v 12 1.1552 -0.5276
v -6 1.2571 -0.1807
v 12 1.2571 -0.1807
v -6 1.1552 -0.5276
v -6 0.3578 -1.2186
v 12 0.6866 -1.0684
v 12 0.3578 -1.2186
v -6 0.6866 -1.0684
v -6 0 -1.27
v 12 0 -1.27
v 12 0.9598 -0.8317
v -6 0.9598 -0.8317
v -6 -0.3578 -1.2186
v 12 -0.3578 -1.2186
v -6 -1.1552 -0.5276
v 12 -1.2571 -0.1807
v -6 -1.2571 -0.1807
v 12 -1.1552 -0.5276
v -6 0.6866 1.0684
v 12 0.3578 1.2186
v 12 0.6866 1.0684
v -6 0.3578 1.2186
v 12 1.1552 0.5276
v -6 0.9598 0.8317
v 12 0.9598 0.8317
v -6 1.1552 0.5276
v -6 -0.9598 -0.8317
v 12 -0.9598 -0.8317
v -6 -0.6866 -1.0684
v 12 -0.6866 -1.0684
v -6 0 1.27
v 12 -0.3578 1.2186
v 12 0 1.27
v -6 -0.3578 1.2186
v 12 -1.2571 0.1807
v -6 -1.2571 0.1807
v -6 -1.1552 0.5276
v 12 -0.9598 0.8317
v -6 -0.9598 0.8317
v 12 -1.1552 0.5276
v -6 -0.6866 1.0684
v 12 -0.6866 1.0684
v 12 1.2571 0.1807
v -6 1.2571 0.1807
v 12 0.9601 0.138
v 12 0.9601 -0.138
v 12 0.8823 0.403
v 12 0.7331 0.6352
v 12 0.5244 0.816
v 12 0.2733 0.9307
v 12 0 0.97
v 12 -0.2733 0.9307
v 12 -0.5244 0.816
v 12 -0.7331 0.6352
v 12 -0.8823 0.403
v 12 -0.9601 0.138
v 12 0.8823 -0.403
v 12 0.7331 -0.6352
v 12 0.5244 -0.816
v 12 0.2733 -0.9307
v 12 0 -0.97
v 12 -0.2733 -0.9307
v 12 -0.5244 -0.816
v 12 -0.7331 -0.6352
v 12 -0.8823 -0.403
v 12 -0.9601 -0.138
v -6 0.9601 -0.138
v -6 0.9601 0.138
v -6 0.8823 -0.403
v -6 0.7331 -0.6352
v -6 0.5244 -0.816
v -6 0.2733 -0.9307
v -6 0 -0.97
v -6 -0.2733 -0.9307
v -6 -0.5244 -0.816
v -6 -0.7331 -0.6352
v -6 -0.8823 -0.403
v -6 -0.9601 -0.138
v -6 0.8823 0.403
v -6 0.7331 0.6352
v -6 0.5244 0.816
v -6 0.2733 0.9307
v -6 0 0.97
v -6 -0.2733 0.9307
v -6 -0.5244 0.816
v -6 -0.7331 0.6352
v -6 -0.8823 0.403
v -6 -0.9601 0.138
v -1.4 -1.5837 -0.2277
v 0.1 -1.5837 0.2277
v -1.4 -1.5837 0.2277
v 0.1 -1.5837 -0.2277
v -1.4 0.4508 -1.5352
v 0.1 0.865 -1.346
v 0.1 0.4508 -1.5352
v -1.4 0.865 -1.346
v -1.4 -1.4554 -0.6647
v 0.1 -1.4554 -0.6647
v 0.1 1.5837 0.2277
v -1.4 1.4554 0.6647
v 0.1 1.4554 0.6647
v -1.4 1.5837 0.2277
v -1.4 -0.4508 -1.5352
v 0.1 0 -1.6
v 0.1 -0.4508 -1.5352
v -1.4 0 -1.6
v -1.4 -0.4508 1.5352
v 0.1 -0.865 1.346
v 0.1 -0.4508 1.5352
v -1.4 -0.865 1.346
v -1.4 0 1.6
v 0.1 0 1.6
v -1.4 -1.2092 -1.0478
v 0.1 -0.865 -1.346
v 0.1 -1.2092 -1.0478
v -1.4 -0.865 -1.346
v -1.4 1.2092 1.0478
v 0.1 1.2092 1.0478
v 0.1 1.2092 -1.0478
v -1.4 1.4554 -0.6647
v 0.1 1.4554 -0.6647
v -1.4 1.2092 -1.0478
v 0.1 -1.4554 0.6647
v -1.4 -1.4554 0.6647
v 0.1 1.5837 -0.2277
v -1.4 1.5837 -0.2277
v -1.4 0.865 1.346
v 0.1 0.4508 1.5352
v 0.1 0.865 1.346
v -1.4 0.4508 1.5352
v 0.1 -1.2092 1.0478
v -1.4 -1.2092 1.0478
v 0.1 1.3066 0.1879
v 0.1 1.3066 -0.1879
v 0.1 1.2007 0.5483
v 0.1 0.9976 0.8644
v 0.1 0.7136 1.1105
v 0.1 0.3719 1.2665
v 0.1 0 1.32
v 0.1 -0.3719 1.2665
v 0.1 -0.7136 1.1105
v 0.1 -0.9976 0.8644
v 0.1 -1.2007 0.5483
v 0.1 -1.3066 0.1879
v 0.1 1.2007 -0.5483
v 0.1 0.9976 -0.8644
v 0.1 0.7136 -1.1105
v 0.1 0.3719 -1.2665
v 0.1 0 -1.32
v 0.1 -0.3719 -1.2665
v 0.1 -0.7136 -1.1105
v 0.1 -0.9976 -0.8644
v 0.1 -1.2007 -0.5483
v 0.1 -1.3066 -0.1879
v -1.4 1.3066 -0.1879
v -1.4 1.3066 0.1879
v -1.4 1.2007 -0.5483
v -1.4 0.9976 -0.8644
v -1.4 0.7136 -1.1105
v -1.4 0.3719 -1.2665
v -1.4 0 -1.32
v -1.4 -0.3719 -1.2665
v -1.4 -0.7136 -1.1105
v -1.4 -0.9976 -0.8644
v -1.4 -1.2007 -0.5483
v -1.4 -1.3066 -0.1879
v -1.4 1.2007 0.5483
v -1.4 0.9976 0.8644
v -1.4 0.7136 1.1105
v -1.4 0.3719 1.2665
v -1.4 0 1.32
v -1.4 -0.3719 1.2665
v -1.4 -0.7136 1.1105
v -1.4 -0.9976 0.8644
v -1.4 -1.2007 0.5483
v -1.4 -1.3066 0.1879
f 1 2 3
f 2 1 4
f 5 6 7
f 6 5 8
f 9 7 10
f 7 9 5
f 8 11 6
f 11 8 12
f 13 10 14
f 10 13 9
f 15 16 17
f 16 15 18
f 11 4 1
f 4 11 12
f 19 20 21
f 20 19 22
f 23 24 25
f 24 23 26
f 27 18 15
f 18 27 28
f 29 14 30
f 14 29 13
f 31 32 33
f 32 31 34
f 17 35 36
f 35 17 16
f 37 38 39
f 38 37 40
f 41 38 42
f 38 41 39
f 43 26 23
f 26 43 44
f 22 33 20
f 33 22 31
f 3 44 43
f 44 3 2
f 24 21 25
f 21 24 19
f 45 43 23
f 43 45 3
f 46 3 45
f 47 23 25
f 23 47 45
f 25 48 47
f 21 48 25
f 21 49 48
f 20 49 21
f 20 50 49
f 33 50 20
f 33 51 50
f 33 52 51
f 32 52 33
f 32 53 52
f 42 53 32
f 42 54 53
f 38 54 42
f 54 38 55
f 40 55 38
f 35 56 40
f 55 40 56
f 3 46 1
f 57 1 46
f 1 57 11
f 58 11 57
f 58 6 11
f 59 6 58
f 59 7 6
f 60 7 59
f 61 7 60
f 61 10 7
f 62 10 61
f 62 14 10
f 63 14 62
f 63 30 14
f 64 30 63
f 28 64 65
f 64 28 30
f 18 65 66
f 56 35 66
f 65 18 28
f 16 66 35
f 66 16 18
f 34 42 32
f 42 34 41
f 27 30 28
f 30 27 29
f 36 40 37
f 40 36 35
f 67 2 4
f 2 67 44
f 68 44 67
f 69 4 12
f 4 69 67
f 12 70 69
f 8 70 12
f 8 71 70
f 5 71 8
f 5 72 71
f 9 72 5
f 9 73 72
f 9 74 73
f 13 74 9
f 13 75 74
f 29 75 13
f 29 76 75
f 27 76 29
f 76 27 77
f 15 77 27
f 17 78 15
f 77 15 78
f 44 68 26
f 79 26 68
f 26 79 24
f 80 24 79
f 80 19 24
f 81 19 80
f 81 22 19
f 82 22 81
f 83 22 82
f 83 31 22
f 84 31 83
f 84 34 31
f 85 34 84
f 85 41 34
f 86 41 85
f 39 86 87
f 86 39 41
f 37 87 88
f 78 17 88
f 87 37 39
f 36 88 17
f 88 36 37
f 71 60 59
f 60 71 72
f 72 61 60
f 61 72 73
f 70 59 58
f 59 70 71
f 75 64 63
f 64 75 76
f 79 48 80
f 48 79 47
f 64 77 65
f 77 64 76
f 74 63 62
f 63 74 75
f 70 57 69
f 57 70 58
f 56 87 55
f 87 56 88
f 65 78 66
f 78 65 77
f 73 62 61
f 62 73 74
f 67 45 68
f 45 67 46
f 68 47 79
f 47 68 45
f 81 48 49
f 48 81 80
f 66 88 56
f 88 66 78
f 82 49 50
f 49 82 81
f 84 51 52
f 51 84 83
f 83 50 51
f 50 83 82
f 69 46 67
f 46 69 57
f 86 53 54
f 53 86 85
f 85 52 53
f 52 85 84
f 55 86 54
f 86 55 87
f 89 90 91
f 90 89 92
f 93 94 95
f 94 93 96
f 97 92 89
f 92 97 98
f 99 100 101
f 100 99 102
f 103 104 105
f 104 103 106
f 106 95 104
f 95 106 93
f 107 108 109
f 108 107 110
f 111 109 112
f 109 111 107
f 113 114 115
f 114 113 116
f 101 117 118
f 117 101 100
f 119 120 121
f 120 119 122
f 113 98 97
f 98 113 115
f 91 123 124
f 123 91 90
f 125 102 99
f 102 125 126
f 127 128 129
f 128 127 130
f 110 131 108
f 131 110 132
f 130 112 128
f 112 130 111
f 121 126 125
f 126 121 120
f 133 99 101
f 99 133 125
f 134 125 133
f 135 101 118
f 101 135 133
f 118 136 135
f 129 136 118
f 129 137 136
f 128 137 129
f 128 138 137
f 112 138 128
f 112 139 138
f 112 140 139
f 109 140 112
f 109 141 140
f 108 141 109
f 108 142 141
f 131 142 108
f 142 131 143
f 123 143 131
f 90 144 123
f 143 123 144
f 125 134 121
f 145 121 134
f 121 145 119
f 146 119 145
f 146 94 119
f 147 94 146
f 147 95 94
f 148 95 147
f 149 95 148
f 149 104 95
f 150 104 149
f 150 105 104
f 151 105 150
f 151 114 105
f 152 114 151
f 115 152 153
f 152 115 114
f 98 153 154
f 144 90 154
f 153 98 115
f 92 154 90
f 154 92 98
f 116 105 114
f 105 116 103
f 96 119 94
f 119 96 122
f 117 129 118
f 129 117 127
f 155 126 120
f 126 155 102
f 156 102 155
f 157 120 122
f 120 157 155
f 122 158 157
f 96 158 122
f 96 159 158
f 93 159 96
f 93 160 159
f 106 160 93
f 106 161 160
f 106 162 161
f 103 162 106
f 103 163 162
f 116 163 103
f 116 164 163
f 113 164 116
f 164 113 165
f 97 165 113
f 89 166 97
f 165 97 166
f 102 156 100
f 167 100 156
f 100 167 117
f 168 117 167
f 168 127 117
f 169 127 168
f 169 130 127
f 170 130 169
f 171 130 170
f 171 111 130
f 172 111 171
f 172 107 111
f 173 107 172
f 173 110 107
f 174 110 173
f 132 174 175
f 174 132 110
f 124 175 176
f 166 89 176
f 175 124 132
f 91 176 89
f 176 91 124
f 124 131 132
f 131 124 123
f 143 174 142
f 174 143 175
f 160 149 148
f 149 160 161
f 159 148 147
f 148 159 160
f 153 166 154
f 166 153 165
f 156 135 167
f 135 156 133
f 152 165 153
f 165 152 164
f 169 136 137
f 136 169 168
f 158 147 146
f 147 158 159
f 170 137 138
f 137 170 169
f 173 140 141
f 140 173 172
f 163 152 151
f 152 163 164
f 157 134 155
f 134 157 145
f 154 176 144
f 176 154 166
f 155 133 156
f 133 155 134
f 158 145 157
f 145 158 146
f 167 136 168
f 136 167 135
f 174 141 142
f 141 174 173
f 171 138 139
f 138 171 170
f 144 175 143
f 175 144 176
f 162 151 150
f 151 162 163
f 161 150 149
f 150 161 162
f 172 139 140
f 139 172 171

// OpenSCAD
module bedpipe(gap_washer = 1.5, fix_to_vertical_wood_l=4.5, pipe_diam=2.54)
{
    fix_to_bed_l = 12;
    pipe_length = fix_to_bed_l + gap_washer + fix_to_vertical_wood_l;
    gap_washer_d = 3.2;
    wall_thickness = 0.3;
    translate([pipe_length/2 - gap_washer - fix_to_vertical_wood_l, 0, 0])
    rotate([0,90,0])
    {
        color([0.69,0.38,0.30, 1.0])
        difference() {
            cylinder(h=pipe_length,r=pipe_diam/2,center = true, $fn = 22); 
            cylinder(h=pipe_length+0.2,r=pipe_diam/2-wall_thickness,center = true, $fn = 22);

        }
        color([0.9,0.9,0.9, 1.0])
        translate([0,0,-pipe_length/2 + gap_washer/2 + fix_to_vertical_wood_l + 0.1])
        difference() {
            cylinder(h=gap_washer,r=gap_washer_d/2,center = true, $fn = 22);
            cylinder(h=gap_washer+0.2,r=pipe_diam/2+0.05,center = true, $fn = 22); 
        }
    }
}   

bedpipe();
